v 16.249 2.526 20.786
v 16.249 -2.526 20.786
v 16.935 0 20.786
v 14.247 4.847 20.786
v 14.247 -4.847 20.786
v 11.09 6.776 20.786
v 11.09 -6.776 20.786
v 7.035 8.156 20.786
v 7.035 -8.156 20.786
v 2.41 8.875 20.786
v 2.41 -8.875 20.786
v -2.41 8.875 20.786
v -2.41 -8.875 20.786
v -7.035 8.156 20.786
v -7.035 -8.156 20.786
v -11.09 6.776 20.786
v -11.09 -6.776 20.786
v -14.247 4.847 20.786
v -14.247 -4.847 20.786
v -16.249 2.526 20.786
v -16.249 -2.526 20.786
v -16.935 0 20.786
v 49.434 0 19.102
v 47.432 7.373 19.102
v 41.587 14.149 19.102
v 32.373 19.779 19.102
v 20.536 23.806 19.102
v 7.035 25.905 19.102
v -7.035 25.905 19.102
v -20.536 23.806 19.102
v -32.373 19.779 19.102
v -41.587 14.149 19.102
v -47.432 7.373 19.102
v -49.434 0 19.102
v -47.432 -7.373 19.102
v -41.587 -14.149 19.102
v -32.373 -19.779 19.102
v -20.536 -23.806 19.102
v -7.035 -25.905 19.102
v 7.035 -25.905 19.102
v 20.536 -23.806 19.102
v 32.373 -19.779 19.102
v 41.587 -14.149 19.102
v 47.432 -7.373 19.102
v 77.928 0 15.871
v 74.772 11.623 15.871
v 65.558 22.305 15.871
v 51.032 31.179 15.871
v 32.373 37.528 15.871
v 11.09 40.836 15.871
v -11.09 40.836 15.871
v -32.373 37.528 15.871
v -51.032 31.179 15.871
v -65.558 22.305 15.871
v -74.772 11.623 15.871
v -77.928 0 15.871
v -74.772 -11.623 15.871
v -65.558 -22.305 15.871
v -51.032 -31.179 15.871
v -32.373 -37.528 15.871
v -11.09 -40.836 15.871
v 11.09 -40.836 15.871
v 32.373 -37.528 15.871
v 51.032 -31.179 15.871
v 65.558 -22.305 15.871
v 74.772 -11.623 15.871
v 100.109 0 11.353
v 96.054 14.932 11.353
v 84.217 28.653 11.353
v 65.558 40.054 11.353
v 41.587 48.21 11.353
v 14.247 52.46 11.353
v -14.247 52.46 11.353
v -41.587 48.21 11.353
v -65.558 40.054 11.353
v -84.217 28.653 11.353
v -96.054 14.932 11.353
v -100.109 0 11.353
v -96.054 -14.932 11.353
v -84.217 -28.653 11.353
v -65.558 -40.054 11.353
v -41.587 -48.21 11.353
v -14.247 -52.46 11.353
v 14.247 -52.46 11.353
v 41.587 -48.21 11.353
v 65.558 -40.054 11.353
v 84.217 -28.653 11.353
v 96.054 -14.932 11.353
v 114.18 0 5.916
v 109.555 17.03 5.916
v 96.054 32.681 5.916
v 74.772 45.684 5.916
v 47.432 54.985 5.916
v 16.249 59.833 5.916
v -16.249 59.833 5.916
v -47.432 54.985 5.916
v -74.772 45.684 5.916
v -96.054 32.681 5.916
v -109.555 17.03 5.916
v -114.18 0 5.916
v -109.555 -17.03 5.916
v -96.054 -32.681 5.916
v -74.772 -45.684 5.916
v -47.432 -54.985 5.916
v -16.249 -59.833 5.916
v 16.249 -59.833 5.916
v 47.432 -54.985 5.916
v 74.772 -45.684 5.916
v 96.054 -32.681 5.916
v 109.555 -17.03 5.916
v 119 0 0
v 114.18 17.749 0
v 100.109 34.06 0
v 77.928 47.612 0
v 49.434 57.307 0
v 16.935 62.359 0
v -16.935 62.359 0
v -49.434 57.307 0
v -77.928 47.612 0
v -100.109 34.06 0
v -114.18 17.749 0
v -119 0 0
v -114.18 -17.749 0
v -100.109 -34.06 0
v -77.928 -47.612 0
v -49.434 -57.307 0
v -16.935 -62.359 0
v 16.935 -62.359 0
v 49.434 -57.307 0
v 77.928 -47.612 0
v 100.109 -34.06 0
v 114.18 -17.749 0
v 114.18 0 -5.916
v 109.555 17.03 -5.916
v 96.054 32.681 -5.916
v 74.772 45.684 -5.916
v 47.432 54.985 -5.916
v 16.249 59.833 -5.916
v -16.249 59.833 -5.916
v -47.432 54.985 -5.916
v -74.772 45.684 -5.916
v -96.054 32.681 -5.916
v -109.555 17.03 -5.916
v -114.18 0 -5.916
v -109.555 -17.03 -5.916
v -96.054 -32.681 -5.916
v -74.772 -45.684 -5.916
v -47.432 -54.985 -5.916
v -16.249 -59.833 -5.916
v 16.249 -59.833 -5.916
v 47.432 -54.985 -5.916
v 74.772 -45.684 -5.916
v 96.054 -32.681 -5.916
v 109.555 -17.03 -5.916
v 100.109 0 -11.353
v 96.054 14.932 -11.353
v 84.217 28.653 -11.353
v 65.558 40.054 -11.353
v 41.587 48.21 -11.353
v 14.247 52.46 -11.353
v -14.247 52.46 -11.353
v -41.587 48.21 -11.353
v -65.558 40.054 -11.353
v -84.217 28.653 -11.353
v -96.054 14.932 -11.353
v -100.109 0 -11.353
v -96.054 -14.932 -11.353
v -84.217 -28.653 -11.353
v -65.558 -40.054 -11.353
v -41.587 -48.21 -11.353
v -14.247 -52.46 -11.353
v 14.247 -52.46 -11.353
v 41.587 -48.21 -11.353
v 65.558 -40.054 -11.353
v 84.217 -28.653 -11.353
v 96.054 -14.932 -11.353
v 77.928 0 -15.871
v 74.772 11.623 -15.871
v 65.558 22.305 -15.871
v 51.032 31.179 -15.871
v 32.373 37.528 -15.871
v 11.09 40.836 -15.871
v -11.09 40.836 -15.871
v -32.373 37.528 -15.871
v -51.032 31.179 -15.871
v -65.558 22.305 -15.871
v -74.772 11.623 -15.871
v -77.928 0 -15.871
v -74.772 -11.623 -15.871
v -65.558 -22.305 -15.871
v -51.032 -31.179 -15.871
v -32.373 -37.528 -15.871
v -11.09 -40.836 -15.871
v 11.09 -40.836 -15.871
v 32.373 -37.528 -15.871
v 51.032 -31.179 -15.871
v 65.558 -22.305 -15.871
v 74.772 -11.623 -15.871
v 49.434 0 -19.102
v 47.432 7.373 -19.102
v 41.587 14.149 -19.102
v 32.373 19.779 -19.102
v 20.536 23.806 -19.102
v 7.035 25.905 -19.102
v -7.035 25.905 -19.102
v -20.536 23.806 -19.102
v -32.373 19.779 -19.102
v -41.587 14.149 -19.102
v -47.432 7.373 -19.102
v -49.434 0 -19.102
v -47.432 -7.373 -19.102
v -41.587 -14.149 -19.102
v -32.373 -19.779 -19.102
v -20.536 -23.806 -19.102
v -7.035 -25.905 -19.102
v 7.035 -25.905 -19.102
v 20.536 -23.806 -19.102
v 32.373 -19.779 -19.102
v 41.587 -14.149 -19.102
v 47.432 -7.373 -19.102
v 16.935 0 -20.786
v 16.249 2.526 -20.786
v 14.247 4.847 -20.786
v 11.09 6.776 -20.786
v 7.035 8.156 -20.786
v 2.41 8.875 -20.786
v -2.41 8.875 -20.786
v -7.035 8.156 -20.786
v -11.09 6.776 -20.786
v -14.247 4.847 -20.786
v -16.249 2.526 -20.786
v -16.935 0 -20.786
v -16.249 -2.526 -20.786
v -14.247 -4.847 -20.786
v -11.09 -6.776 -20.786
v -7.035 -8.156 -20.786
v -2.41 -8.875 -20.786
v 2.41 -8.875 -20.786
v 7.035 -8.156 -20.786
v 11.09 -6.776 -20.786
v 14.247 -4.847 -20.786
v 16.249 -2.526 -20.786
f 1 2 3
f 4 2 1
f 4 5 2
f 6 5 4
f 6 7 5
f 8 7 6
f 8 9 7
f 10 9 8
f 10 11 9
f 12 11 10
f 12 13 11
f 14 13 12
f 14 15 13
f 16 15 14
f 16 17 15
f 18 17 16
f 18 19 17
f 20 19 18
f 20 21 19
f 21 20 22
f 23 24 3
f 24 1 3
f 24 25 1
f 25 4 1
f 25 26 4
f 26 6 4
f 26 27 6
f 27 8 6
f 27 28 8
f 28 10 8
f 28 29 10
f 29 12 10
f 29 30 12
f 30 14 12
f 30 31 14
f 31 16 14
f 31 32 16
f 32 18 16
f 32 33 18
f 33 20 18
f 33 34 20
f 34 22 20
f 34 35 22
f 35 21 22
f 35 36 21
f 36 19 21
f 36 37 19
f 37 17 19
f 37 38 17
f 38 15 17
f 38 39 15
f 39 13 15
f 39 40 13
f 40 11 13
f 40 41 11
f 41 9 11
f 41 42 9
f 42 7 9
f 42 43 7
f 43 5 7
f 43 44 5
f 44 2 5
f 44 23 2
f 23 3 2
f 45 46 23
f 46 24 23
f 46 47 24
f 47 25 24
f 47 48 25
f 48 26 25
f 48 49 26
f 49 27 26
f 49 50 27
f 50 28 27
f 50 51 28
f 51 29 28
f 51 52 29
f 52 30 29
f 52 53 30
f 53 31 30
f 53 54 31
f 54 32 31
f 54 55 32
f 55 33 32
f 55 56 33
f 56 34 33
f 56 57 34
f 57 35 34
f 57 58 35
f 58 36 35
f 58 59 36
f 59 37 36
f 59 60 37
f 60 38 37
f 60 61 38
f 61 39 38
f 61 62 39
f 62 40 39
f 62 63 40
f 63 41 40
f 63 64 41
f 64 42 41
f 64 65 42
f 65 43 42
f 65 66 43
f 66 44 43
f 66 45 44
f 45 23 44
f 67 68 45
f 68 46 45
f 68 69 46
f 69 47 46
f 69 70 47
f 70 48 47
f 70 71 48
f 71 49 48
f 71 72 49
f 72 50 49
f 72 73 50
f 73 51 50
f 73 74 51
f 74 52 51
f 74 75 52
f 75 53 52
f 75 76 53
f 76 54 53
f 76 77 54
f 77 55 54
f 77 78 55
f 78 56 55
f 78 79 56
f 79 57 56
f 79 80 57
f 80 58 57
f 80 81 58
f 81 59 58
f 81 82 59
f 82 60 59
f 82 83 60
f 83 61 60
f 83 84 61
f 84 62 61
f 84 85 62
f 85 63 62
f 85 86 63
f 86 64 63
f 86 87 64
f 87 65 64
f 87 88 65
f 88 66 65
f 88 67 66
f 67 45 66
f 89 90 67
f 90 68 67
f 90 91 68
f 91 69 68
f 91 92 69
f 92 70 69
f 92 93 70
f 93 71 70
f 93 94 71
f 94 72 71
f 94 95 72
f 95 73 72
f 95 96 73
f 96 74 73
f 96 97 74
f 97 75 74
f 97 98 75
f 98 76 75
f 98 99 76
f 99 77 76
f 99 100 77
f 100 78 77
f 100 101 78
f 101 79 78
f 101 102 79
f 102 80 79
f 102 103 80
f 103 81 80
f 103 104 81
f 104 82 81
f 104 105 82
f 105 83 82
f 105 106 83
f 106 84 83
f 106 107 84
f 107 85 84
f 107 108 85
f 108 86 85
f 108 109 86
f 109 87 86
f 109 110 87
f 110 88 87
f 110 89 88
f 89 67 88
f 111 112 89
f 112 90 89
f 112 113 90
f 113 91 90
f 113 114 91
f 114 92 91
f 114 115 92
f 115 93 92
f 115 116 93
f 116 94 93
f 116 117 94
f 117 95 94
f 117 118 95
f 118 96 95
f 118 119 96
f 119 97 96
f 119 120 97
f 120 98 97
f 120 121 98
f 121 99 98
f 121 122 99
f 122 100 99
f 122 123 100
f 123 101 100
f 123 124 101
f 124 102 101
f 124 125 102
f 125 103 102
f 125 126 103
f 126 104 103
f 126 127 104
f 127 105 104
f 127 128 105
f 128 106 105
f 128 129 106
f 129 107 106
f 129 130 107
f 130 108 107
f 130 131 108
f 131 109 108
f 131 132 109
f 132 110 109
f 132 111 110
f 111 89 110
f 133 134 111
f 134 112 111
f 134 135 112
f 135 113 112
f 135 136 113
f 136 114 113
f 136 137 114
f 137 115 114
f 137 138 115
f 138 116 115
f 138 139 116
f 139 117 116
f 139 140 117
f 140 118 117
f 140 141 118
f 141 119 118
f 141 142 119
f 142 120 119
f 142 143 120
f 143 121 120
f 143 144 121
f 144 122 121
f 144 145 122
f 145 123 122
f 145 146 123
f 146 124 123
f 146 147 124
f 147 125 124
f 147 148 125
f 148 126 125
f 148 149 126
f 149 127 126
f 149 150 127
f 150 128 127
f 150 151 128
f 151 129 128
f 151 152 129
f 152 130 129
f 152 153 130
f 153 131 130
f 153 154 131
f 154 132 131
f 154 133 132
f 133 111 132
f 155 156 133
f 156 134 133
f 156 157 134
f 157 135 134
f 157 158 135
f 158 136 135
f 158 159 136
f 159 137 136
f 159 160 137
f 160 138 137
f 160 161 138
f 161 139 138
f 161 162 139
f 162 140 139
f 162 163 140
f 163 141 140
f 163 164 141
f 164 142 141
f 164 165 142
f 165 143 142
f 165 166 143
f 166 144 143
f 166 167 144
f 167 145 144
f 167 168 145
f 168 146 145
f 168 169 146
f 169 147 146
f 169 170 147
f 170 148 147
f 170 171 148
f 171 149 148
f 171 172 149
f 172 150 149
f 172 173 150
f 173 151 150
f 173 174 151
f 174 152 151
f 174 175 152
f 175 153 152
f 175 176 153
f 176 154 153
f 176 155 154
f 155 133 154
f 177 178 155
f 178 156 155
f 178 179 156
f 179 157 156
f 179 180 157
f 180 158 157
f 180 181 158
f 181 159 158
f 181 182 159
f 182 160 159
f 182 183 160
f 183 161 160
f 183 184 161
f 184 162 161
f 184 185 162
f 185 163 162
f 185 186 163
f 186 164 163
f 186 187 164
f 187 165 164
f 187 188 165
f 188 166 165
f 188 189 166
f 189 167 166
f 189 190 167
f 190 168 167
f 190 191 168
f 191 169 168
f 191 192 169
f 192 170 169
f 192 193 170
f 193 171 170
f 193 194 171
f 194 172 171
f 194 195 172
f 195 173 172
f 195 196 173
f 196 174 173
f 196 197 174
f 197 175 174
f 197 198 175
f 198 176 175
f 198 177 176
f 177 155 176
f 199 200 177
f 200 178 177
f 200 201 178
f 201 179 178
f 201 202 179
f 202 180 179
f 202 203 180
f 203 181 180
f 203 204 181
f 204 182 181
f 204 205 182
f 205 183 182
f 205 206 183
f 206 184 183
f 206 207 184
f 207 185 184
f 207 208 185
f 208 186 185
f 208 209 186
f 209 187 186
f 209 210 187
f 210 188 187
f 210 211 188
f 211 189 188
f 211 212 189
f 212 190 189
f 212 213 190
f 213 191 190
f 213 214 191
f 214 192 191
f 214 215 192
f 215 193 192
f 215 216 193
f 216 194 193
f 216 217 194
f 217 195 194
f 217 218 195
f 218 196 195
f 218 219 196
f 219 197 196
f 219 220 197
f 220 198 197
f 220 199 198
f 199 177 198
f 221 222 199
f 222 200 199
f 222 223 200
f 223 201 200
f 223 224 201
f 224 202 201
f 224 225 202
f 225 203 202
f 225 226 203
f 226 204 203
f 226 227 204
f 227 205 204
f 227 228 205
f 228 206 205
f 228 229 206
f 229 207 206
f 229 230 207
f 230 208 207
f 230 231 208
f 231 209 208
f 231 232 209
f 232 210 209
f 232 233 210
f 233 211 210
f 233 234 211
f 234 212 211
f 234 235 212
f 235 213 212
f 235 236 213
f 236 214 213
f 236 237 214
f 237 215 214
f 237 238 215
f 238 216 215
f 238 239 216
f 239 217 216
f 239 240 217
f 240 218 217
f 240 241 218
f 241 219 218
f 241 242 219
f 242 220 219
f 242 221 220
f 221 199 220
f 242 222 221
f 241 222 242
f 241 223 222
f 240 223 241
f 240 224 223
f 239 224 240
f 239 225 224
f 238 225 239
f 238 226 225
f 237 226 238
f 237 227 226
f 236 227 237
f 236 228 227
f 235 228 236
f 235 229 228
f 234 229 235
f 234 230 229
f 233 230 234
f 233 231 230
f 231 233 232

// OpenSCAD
// Generated by SolidPython 1.0.1 on 2020-07-29 00:46:53


scale(v = [17, 9, 3]) {
	sphere(r = 7);
}
/***********************************************
*********      SolidPython code:      **********
************************************************
 
# import packages: SolidPython
from solid import *
from solid.utils import *
from itertools import chain, combinations, permutations


class Resize:

    def __init__(self, scad_file):
        self.scad_file = scad_file
        #self.scad_file = import_scad(scad_file)
        # cone/cylinder param:
        self.r1 = 0
        self.r2 = 0
        self.h = 0
        # rectangular prism param:
        self.w = 0
        self.l = 0
        # ellipse param:
        self.r = 0

    # import OpenScad code (file name corresponds to shape)


    # classify shape + parameters
    def assign(self, param1, param2, param3):
        if self.scad_file == 'cone.scad':
            self.r1 = param1
            self.r2 = param2
            self.h = param3
        elif self.scad_file == 'cylinder.scad':
            self.r1 = param1
            self.r2 = param2
            self.h = param3
        elif self.scad_file == 'rectangularPrism.scad':
            self.h = param1
            self.l = param2
            self.w = param3
        else:
            self.r = param1
            self.h = param2

    # resize parameters
    def iterate(self):
        x = range(3, 20, 2)
        i = 1
        if self.scad_file == 'cone.scad':
            tempList = list(permutations(x, 2))
            for temp in tempList:
                param1 = temp[0]
                param2 = temp[1]
                filepath = 'produced_scad_files/' + 'cone' + str(param1) + '_' + str(param2) + '_' + '.scad'
                scad_render_to_file(cylinder(h=param1, r1=param2, r2=0), filepath)

        elif self.scad_file == 'cylinder.scad':
            tempList = list(permutations(x, 3))
            for temp in tempList:
                param1 = temp[0]
                param2 = temp[1]
                filepath = 'produced_scad_files/' + 'cylinder' + str(param1) + '_' + str(param2) + '_' + '.scad'
                scad_render_to_file(cylinder(h=param1, r1=param2, r2=param2), filepath)

        elif self.scad_file == 'rectangularPrism.scad':
            tempList = list(permutations(x, 3))
            for temp in tempList:
                param1 = temp[0]
                param2 = temp[1]
                param3 = temp[2]
                filepath = 'produced_scad_files/' + 'rectangularPrism' + str(param1) + '_' + str(param2) + '_' + str(
                    param3) + '.scad'
                scad_render_to_file(cube(size=(param1, param2, param3)), filepath)

        elif self.scad_file == 'ellipse.scad':
            tempList = list(permutations(x, 4))
            for temp in tempList:
                param1 = temp[0]
                param2 = temp[1]
                param3 = temp[2]
                param4 = temp[3]
                filepath = 'produced_scad_files/' + 'ellipse' + str(param1) + '_' + str(param2) + '_' + str(param3) + '_' + str(param4) + '.scad'
                scad_render_to_file(scale([param1, param2, param3])(sphere(r=param4)), filepath)

    def render_to_scadfile(self):
        scad_render_to_file(scad, 'example.scad') 
 
************************************************/
